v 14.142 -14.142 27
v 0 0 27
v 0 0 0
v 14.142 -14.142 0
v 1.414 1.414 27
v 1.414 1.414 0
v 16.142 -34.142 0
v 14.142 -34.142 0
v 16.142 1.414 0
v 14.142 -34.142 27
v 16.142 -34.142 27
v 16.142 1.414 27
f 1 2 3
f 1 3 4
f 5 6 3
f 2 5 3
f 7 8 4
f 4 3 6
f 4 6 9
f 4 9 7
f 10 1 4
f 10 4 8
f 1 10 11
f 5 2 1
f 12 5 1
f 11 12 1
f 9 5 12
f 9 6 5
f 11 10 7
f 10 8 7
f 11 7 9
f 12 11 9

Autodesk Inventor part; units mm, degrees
ref_plane "YZ Plane" through (0, 0, 0) normal (1, 0, 0) x (0, 1, 0)
ref_plane "XZ Plane" through (0, 0, 0) normal (0, 1, 0) x (-1, 0, 0)
ref_plane "XY Plane" through (0, 0, 0) normal (0, 0, 1) x (1, 0, 0)
sketch "Sketch1" plane through (0, 0, 0) normal (0, 0, 1) x (1, 0, 0)
  line L0 (0, 0) -> (14.1421, -14.1421)
  line L1 (0, 0) -> (20, 0) construction
  line L2 (14.1421, -14.1421) -> (15.5563, -12.7279)
  line L3 (15.5563, -12.7279) -> (1.4142, 1.4142)
  line L4 (1.4142, 1.4142) -> (0, 0)
  line L5 (1.4142, 1.4142) -> (15.5563, 1.4142)
  line L6 (14.1421, -14.1421) -> (14.1421, -34.1421)
  line L7 (14.1421, -34.1421) -> (16.1421, -34.1421)
  line L8 (16.1421, -34.1421) -> (16.1421, 1.4142)
  line L9 (16.1421, 1.4142) -> (15.5563, 1.4142)
  dimension "d0" = 20
  dimension "d1" = 45
  dimension "d2" = 2
  dimension "d3" = 20
  dimension "d4" = 20
  dimension "d6" = 2
extrude "Extrusion1" add sketch "Sketch1" along normal blind 27
sketch "Sketch2" plane through (14.1421, -14.1421, 27) normal (-0.7071, -0.7071, 0) x (-0.7071, 0.7071, 0)
  line L0 (20, 27) -> (0, 27) projected
  line L1 (0, 27) -> (0, 0) projected
  line L2 (0, 27) -> (10, 27)
  line L3 (10, 27) -> (10, 13.5)
  line L4 (20, 27) -> (20, 0) projected
  line L5 (10, 13.5) -> (10, 19.5)
  line L6 (10, 19.5) -> (15, 19.5)
  line L7 (15, 19.5) -> (15, 7.5)
  line L8 (15, 7.5) -> (5, 7.5)
  line L9 (5, 7.5) -> (5, 19.5)
  line L10 (5, 19.5) -> (10, 19.5)
  line L11 (10, 13.5) -> (10, 23.5)
  circle A0 centre (10, 23.5) radius 1.5
  circle A1 centre (10, 23.5) radius 3.5
  line L12 (10, 13.5) -> (10, 3.5)
  circle A2 centre (10, 3.5) radius 1.5
  circle A3 centre (10, 3.5) radius 3.5
  dimension "d20" = 10
  dimension "d21" = 6
  dimension "d22" = 5
  dimension "d23" = 12
  dimension "d24" = 10
  dimension "d25" = 10
  dimension "d26" = 3
  dimension "d27" = 7
  dimension "d28" = 10
  dimension "d29" = 3
  dimension "d30" = 7
properties part number "Time of Flight 4.0"
